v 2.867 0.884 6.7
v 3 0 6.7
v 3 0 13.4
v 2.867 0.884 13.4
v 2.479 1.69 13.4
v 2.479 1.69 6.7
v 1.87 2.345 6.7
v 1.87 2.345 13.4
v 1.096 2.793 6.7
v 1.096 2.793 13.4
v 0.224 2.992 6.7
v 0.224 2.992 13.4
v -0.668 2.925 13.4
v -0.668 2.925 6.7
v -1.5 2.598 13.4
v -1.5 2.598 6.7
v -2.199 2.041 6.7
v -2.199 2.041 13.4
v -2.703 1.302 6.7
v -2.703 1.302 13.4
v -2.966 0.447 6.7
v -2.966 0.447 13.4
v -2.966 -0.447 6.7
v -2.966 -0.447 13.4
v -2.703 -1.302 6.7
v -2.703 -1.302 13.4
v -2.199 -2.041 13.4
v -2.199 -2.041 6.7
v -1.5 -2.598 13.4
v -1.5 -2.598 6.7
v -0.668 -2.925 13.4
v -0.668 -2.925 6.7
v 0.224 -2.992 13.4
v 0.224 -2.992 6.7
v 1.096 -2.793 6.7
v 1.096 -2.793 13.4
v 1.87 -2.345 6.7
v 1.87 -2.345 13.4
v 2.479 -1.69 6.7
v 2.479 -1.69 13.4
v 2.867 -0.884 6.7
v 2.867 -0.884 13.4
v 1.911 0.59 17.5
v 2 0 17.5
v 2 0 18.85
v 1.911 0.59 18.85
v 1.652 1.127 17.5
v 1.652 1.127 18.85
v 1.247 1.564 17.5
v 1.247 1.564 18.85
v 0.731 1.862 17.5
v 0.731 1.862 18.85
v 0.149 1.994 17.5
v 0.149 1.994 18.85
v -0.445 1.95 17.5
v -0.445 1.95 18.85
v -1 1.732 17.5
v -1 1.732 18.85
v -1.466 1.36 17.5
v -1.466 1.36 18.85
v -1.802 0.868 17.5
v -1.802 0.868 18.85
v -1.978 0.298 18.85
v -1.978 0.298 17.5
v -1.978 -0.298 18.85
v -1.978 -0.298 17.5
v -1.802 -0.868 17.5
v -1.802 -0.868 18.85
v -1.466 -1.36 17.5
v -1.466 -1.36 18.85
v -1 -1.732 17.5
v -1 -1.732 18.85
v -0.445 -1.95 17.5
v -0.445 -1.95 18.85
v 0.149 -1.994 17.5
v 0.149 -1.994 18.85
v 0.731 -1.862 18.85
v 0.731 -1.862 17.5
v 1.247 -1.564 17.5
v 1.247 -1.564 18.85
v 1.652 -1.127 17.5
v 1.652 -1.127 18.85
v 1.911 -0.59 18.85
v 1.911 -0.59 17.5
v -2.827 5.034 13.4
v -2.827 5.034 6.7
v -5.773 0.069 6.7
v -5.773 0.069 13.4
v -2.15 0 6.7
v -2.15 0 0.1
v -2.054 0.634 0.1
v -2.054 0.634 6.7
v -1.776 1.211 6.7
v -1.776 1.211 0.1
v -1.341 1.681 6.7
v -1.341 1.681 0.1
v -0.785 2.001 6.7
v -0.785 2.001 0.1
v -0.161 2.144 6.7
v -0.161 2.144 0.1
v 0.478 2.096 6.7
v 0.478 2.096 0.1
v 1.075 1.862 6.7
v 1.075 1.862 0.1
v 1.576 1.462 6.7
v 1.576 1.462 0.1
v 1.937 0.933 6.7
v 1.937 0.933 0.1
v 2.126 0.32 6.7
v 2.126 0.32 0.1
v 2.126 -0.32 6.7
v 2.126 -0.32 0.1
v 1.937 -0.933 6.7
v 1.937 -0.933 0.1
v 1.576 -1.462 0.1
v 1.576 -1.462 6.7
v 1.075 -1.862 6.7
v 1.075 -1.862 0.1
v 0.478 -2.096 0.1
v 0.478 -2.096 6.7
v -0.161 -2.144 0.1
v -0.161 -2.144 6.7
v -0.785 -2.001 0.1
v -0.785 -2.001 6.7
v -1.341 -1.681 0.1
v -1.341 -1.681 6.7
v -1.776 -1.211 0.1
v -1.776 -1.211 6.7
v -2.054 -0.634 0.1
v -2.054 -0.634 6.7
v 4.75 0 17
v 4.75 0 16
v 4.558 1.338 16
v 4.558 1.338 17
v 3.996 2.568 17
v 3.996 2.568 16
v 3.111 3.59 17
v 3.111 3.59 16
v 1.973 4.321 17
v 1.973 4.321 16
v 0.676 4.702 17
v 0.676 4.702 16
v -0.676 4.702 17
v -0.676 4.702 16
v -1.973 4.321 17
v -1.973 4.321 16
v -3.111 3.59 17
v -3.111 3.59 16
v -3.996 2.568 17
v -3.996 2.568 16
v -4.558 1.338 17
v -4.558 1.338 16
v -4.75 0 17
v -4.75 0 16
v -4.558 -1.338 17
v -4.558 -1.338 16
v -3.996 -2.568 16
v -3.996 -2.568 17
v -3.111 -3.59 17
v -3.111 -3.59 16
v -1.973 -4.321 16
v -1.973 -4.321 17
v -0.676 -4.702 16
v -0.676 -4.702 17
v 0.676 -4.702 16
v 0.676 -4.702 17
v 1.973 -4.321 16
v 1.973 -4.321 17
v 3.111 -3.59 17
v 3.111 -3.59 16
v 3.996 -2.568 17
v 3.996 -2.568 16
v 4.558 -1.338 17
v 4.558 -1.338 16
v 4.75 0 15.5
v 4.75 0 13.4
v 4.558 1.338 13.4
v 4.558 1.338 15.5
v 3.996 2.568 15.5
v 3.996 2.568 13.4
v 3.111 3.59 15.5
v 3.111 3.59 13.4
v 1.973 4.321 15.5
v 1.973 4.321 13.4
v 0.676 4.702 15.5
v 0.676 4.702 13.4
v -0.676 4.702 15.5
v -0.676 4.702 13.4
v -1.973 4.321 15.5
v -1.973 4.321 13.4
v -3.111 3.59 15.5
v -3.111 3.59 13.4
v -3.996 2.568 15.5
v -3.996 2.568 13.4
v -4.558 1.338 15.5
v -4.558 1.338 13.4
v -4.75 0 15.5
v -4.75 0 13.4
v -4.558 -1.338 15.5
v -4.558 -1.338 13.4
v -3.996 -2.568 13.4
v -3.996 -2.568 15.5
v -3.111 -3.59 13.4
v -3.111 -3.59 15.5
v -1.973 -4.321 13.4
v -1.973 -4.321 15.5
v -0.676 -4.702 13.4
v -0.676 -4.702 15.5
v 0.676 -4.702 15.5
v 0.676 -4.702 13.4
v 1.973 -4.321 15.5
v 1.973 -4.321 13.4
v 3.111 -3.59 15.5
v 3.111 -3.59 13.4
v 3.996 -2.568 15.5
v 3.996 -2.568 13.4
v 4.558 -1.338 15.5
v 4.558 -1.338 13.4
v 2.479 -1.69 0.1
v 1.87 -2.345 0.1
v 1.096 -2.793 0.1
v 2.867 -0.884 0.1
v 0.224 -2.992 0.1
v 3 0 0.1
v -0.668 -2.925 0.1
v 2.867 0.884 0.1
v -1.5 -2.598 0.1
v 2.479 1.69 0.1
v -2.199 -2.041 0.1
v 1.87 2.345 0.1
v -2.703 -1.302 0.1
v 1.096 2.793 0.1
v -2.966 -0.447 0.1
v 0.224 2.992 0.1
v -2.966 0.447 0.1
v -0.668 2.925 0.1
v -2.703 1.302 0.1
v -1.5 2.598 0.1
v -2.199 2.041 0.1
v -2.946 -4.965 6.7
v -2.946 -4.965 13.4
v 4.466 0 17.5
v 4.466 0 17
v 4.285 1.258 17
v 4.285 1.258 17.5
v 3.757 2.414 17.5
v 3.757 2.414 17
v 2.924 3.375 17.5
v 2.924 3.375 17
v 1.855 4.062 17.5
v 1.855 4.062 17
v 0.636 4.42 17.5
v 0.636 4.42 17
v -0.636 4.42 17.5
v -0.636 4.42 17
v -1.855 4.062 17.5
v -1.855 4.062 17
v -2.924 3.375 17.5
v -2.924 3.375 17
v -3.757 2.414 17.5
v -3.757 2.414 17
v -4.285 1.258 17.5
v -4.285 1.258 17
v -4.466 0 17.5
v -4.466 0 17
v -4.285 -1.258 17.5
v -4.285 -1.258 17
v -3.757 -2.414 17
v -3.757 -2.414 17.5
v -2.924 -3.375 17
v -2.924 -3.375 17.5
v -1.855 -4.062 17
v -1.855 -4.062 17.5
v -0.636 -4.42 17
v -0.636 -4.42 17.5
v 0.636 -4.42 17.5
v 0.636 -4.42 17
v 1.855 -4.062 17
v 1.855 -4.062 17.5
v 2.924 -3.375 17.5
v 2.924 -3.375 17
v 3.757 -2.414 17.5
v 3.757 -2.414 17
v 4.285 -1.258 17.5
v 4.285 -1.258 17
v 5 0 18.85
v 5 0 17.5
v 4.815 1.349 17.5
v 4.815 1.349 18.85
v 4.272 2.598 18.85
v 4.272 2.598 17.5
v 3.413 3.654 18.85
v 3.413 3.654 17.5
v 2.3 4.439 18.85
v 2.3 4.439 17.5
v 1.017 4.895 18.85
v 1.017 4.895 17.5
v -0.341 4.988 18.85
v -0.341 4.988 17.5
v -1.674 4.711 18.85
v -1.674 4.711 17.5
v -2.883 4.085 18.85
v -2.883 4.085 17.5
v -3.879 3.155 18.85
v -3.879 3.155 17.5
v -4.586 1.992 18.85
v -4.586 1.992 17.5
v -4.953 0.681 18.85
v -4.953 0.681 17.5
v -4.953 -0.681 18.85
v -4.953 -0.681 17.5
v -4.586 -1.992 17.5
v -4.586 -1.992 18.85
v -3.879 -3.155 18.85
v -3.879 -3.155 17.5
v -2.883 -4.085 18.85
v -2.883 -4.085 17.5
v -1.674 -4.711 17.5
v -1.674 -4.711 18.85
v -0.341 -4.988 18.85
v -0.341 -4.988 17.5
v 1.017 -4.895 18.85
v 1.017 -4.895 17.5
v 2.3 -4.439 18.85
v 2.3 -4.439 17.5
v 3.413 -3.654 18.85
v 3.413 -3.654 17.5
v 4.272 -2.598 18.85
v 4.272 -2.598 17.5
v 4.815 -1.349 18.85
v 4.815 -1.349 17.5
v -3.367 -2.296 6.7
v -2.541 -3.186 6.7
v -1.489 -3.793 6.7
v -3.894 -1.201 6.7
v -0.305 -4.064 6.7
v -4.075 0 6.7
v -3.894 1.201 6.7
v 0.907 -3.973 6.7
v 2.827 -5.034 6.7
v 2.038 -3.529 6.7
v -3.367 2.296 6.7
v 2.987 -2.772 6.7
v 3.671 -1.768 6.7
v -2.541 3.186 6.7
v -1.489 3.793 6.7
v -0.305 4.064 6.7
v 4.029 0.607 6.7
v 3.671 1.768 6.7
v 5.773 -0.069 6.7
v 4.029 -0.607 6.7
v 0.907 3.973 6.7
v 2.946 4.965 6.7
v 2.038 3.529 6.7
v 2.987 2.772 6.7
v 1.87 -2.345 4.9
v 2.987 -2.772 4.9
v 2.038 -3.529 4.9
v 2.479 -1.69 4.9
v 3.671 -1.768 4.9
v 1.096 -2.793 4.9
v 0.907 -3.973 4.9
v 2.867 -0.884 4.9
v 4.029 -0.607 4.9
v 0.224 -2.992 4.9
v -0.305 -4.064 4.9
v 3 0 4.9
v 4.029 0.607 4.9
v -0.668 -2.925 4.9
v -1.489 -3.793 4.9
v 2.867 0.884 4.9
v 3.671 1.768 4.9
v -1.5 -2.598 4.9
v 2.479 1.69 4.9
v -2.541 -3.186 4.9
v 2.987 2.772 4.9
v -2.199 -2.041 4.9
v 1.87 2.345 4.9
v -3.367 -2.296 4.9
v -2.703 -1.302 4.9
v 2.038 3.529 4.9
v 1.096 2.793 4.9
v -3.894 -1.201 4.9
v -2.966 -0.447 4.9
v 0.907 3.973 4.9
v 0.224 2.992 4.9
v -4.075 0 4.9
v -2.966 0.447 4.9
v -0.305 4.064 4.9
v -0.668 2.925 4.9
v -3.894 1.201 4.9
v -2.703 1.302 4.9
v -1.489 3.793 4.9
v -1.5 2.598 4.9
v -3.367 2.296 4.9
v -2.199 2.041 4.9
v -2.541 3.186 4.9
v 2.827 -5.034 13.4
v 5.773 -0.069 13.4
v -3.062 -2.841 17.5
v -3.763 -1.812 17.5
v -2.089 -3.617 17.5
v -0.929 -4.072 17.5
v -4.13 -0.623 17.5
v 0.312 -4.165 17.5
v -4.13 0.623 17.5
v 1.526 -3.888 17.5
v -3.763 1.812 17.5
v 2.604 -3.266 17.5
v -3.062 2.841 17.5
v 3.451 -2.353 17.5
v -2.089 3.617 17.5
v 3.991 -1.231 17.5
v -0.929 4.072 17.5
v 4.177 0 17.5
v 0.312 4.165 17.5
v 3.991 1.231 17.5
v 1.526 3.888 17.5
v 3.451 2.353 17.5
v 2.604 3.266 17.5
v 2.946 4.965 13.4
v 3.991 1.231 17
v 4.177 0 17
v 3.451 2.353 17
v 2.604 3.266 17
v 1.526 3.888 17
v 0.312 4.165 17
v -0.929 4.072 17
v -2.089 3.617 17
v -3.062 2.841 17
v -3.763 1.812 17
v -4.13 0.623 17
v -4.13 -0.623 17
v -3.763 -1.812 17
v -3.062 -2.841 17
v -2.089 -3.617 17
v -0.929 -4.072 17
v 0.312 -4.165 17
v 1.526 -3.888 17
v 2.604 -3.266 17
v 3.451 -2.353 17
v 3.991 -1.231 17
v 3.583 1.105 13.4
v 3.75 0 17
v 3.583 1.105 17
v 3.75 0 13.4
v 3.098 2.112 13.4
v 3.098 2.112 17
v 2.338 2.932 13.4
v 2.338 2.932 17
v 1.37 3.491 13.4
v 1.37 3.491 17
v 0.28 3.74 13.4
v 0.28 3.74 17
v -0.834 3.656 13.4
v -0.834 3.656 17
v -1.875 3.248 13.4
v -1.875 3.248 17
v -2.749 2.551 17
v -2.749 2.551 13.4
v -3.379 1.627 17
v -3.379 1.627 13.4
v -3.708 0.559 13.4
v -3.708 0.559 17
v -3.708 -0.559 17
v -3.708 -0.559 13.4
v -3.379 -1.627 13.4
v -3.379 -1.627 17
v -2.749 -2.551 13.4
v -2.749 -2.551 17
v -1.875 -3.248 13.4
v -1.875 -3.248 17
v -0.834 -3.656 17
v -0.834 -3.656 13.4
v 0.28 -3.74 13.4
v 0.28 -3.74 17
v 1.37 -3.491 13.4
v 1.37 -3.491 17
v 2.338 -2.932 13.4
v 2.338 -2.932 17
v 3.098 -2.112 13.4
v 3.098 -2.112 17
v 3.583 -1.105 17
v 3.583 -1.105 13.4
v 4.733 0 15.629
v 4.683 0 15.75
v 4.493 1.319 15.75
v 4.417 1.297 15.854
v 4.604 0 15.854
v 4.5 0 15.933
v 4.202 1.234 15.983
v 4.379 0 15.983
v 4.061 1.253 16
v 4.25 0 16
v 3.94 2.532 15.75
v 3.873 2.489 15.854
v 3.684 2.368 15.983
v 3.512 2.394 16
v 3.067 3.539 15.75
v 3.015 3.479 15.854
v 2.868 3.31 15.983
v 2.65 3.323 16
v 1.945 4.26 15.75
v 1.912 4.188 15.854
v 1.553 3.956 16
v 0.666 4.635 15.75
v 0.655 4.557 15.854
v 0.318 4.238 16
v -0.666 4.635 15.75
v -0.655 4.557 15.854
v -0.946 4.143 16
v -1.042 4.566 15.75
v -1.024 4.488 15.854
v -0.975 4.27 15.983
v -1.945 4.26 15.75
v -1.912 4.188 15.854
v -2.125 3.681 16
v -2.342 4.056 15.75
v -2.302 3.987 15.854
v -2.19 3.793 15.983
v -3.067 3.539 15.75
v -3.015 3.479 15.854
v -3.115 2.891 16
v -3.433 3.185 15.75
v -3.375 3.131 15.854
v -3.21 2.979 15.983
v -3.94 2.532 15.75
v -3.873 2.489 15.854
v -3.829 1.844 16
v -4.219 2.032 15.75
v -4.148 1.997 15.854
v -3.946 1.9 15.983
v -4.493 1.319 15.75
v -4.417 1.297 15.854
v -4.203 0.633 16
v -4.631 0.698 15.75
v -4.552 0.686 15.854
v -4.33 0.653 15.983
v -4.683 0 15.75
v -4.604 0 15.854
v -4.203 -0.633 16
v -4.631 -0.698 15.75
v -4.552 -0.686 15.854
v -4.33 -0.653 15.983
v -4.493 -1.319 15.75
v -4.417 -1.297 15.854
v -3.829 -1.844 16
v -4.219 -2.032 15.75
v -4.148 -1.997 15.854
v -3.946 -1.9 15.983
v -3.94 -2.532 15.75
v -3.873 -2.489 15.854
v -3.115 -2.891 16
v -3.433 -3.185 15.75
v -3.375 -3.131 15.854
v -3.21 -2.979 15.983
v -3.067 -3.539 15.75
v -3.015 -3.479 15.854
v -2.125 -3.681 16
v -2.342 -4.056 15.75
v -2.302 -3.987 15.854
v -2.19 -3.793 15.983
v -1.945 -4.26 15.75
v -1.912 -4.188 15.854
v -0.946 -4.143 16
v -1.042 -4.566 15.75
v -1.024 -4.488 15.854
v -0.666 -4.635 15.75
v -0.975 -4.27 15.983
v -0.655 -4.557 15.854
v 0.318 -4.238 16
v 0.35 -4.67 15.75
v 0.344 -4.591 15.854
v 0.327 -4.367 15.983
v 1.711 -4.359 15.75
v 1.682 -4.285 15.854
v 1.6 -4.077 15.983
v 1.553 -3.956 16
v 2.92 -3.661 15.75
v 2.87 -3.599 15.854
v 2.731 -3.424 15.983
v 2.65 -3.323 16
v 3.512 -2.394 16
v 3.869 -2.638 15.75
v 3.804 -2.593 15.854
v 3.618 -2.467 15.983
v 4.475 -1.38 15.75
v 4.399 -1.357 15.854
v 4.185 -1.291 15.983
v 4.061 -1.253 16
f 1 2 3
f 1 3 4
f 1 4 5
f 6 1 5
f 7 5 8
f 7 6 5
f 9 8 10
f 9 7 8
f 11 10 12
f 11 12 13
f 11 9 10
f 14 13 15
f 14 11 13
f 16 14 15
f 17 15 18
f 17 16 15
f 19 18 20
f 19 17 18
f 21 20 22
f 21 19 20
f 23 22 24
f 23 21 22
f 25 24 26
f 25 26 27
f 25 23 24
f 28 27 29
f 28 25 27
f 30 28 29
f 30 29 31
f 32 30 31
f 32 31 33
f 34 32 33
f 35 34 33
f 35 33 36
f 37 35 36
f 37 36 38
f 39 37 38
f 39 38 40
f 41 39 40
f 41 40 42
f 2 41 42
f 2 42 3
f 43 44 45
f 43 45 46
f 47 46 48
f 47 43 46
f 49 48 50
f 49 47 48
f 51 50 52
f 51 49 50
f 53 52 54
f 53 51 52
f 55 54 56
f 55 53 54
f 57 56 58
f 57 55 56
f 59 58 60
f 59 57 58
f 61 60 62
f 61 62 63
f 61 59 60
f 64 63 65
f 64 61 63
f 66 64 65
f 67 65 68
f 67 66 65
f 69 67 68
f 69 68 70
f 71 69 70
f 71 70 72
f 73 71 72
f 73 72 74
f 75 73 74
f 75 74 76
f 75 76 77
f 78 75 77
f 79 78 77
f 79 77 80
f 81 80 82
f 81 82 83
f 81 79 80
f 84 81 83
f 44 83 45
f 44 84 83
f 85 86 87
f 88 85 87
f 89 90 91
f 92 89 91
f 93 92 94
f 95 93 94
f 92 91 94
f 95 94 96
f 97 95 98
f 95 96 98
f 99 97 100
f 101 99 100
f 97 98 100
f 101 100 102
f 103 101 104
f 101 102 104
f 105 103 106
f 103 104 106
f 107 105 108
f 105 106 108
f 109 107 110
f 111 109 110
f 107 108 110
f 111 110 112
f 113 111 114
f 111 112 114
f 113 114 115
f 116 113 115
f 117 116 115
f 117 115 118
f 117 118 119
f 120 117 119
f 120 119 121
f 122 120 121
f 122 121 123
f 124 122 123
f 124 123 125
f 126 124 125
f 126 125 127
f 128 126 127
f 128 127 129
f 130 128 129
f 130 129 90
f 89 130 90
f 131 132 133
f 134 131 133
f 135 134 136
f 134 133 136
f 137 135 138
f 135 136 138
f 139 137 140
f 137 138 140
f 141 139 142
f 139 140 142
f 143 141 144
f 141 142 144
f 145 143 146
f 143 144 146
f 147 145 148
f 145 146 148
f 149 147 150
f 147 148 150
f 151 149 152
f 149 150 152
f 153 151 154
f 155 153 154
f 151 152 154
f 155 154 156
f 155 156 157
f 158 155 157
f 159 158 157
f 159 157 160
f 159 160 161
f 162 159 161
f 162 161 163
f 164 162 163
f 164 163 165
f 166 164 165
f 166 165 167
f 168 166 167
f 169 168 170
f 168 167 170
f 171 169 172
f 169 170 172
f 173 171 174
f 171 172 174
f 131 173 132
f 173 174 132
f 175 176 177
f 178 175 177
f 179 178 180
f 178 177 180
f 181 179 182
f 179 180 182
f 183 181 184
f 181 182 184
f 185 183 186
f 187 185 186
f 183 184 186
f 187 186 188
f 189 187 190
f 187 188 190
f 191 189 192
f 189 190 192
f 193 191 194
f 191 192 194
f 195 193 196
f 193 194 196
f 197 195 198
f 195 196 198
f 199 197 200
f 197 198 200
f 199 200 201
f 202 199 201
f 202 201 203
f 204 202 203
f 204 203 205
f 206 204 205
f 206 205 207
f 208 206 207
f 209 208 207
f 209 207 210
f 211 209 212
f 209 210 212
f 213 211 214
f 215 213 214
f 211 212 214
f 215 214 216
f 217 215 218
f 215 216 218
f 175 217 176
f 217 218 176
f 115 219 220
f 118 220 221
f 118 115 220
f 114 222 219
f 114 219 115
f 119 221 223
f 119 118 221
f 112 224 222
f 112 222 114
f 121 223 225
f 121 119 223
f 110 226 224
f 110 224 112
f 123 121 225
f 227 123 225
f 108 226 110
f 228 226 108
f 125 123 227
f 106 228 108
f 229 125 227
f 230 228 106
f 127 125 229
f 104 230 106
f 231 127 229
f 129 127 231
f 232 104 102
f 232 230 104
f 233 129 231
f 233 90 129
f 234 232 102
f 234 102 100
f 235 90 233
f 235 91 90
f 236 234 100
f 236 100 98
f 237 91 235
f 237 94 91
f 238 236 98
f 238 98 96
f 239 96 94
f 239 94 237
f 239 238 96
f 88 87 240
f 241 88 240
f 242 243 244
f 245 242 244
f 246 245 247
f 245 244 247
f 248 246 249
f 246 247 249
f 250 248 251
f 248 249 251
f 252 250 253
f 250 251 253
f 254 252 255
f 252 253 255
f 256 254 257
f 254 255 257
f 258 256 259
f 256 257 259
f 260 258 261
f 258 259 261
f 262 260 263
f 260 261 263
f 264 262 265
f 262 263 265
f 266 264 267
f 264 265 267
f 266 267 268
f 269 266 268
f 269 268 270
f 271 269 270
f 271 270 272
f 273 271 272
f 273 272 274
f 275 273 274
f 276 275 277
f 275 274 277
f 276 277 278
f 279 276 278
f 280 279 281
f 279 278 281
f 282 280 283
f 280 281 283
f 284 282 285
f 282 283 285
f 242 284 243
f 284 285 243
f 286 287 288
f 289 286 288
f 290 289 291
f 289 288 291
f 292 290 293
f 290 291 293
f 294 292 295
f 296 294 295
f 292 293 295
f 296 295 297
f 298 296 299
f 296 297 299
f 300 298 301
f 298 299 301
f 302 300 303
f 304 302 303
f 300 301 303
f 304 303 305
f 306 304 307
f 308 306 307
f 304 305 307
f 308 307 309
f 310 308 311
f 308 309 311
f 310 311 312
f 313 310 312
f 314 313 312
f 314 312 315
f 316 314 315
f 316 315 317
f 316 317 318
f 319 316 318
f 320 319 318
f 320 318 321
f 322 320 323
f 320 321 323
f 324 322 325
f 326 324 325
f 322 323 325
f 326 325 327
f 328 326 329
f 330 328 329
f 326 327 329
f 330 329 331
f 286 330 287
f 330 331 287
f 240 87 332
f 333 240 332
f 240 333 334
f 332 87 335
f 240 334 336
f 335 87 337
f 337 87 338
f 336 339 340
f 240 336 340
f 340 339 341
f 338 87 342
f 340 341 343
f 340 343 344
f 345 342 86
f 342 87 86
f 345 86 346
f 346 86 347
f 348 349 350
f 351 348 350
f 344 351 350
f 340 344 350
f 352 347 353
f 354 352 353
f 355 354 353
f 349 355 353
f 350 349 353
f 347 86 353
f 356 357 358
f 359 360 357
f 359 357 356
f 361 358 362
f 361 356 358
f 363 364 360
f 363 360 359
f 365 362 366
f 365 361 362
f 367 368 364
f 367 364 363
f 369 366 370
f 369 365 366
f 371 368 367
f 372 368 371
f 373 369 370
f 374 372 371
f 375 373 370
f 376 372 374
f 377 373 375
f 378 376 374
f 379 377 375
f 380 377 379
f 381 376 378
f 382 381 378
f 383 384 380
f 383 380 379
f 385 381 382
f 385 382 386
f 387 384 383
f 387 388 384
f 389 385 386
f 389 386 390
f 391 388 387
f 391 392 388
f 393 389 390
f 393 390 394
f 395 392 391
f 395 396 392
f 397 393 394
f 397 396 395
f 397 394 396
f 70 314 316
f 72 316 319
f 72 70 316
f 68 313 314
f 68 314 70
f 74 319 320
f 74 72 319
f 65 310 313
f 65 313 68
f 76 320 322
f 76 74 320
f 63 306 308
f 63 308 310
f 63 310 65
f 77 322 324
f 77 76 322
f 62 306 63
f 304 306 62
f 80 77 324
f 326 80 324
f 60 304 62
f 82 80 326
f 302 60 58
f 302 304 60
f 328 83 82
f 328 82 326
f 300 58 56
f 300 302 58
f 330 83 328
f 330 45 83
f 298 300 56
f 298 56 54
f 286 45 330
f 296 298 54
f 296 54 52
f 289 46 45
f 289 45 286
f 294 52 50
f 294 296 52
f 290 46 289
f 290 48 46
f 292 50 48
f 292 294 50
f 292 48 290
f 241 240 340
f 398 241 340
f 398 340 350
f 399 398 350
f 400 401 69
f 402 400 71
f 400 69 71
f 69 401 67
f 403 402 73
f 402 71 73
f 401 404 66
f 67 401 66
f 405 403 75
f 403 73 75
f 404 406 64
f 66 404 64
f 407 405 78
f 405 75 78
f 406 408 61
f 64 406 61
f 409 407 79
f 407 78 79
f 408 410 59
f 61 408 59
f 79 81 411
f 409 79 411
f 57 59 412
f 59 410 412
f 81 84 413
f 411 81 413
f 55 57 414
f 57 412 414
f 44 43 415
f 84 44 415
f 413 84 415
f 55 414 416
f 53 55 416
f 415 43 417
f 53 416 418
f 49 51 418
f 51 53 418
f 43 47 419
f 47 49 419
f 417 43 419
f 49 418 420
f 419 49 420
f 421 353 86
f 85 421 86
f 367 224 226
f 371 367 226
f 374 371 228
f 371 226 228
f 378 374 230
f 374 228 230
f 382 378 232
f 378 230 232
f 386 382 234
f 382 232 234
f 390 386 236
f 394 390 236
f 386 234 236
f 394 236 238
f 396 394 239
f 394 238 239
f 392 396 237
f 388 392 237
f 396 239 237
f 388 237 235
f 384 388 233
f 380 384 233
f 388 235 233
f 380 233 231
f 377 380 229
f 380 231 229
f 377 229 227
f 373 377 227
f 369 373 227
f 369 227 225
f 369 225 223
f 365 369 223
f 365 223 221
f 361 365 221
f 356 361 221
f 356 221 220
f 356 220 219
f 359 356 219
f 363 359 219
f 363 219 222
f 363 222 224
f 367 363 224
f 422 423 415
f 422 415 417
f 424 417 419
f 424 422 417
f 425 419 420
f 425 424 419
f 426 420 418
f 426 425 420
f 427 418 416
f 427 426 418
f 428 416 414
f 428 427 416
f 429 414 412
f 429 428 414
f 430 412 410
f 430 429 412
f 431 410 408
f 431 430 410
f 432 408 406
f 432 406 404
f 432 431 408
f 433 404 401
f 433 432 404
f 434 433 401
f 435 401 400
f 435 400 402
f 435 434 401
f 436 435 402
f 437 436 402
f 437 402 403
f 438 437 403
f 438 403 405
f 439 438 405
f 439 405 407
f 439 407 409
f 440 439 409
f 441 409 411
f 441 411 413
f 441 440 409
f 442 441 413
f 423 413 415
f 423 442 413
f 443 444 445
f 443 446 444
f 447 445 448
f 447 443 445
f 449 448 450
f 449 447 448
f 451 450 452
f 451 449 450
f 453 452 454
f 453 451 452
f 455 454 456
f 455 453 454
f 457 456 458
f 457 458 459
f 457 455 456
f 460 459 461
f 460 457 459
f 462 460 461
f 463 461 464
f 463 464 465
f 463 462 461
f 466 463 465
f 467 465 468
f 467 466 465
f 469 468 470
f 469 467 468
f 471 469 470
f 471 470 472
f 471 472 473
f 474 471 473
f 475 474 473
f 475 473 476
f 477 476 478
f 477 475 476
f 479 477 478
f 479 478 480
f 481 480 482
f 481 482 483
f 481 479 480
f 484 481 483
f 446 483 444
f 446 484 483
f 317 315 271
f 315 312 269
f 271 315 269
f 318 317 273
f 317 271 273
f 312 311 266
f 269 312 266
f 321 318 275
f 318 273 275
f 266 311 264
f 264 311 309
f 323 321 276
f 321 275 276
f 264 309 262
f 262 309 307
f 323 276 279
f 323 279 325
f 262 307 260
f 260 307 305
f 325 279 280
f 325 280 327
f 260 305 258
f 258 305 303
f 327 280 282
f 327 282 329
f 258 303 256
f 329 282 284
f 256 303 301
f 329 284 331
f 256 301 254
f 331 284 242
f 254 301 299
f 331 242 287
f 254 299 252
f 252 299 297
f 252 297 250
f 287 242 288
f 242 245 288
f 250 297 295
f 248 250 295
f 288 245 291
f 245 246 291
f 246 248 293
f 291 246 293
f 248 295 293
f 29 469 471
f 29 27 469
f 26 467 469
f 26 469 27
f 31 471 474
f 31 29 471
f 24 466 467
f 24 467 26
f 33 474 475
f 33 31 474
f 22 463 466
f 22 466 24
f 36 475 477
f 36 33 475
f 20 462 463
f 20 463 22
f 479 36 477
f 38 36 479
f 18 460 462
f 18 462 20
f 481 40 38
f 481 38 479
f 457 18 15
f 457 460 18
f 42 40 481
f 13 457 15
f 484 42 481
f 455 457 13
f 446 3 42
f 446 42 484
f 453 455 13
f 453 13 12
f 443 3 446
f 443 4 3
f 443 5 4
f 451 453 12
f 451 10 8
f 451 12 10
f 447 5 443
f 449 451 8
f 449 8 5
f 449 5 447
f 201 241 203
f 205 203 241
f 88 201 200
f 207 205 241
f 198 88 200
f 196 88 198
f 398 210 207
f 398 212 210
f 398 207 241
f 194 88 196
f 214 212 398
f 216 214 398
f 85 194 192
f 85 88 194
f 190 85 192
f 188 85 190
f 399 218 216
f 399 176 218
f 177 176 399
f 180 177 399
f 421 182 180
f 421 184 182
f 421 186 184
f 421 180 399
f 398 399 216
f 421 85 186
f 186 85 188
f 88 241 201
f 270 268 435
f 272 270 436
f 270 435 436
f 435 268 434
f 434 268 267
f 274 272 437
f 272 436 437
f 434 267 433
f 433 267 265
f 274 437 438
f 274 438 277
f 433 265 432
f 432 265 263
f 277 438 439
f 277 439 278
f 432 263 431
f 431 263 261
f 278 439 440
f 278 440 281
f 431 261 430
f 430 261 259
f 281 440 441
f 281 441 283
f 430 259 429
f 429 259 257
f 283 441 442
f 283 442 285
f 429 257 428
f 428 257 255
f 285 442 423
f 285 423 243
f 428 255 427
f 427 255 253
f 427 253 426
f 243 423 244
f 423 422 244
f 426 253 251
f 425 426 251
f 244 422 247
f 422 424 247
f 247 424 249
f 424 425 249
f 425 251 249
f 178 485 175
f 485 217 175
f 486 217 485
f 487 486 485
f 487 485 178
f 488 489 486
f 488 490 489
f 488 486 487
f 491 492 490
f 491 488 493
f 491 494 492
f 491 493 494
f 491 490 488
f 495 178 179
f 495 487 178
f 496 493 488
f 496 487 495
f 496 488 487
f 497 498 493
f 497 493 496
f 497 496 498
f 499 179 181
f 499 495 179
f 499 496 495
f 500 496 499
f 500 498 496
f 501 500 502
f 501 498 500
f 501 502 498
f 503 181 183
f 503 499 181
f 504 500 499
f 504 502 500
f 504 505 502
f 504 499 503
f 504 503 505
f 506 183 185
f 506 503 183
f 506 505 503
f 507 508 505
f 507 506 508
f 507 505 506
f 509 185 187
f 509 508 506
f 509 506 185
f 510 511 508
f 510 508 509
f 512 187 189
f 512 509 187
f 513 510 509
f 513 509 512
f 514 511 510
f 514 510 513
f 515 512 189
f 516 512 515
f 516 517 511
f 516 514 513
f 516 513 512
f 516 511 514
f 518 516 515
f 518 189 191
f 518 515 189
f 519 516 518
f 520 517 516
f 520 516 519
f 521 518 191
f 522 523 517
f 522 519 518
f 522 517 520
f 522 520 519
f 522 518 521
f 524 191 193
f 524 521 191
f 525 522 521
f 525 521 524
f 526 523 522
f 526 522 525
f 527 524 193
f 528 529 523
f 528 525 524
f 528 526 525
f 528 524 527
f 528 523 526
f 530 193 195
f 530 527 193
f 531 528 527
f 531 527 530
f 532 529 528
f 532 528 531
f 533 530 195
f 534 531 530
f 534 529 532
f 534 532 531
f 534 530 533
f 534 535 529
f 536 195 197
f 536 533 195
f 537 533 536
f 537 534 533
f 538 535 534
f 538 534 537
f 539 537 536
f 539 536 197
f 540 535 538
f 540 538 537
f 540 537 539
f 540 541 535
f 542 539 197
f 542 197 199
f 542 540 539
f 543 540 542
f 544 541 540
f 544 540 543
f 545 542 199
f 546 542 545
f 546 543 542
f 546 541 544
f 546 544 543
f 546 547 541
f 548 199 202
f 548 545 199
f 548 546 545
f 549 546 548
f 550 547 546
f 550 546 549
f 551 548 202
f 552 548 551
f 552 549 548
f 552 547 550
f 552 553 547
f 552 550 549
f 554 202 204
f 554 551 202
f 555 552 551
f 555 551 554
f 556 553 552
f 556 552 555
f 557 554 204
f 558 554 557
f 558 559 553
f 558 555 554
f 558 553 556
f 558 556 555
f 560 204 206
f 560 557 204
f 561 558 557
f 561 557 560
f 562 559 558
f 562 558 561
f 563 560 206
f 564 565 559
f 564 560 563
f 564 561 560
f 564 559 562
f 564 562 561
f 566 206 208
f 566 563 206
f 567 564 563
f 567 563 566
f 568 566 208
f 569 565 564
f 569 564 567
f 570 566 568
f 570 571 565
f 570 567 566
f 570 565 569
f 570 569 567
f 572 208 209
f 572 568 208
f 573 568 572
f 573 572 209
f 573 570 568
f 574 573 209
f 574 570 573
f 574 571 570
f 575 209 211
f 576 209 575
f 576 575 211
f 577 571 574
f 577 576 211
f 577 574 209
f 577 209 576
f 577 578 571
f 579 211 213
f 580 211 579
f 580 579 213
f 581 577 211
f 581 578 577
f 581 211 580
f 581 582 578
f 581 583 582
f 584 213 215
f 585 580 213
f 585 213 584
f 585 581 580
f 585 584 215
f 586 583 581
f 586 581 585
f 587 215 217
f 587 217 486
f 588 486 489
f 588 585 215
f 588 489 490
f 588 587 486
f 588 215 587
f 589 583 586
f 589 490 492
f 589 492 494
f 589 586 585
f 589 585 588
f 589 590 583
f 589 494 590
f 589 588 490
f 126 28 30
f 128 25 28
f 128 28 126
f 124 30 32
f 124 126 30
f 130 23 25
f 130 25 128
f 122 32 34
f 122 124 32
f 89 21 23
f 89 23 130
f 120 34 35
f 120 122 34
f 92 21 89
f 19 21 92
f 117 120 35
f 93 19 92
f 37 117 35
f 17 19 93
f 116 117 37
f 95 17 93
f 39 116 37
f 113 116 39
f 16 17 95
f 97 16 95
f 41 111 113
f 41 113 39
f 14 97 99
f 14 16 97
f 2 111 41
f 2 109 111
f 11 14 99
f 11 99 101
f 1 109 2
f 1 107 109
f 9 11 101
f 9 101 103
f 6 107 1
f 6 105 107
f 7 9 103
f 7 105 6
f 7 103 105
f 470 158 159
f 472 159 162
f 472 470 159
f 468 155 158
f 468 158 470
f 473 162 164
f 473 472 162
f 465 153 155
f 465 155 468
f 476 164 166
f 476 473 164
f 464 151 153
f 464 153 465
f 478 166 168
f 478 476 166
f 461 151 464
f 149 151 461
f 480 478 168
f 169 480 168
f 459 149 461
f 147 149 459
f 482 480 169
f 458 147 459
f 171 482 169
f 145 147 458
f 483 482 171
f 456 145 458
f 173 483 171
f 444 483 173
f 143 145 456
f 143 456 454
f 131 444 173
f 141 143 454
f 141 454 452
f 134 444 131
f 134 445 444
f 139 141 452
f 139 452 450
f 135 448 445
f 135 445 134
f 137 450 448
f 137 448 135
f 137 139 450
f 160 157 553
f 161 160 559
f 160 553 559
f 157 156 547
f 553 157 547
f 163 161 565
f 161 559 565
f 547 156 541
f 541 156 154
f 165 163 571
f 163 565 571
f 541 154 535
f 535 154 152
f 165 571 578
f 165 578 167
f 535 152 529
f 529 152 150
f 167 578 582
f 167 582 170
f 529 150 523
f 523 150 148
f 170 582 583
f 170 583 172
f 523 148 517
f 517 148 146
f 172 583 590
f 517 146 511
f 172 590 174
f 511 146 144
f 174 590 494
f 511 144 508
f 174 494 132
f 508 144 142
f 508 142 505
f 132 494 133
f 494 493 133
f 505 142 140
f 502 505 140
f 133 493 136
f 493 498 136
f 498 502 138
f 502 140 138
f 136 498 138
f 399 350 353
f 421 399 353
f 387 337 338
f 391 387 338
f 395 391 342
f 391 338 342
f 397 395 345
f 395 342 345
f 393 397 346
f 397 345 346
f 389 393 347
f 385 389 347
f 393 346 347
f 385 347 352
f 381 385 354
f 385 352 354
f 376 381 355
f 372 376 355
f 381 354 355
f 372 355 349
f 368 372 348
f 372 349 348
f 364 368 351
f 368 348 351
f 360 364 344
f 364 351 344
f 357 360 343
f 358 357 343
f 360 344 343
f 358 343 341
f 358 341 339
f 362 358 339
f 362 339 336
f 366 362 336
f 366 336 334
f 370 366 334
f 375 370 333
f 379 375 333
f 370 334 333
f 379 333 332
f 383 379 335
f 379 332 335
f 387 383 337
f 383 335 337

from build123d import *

# Parameters (mm, degrees)
SKETCH_1_R          = 3
EXTRUDE_1_DEPTH     = 6.7
SKETCH_2_R          = 3
EXTRUDE_2_DEPTH     = 6.7
SKETCH_3_R          = 3.2
CUT_EXTRUDE_1_DEPTH = 0.1
SKETCH_4_R          = 2.15
CUT_EXTRUDE_2_DEPTH = 12.6
SKETCH_5_R          = 4.75
SKETCH_5_R_2        = 3.75
EXTRUDE_3_DEPTH     = 2.6
FILLET_1_R          = 0.5
SKETCH_6_R          = 4.75
SKETCH_6_R_2        = 3.75
EXTRUDE_4_DEPTH     = 1
SKETCH_7_R          = 4.465730979
SKETCH_7_R_2        = 4.177014906
EXTRUDE_5_DEPTH     = 0.5
SKETCH_8_R          = 5
SKETCH_8_R_2        = 2
EXTRUDE_6_DEPTH     = 1.35
SKETCH_9_R          = 4.075
SKETCH_9_R_2        = 3
EXTRUDE_7_DEPTH     = 1.8


with BuildPart() as part:
    # 草图1 → 凸台-拉伸1 (new body)
    with BuildSketch(Plane.XY):
        Circle(SKETCH_1_R)
    extrude(amount=EXTRUDE_1_DEPTH)

    # 草图3 → 切除-拉伸1 (cut)
    with BuildSketch(Plane(origin=(0, 0, 0), x_dir=(-1, 0, 0), z_dir=(0, 0, -1))):
        Circle(SKETCH_3_R)
    extrude(amount=-CUT_EXTRUDE_1_DEPTH, mode=Mode.SUBTRACT)

    # 草图4 → 切除-拉伸2 (cut)
    with BuildSketch(Plane(origin=(0, 0, 0.1), x_dir=(-1, 0, 0), z_dir=(0, 0, -1))):
        Circle(SKETCH_4_R)
    extrude(amount=-CUT_EXTRUDE_2_DEPTH, mode=Mode.SUBTRACT)



with BuildPart() as body_2:
    # 草图2 → 凸台-拉伸2 (new body)
    with BuildSketch(Plane.XY.offset(6.7)):
        Polygon((2.82688706, -5.034088089), (5.7730917, -0.068888037), (2.946204639, 4.965200052), (-2.82688706, 5.034088089), (-5.7730917, 0.068888037), (-2.946204639, -4.965200052), align=None)
        Circle(SKETCH_2_R, mode=Mode.SUBTRACT)
    extrude(amount=EXTRUDE_2_DEPTH)

    # 草图5 → 凸台-拉伸3 (add)
    with BuildSketch(Plane.XY.offset(13.4)):
        Circle(SKETCH_5_R)
        Circle(SKETCH_5_R_2, mode=Mode.SUBTRACT)
    extrude(amount=EXTRUDE_3_DEPTH)

    # 圆角1
    fillet_1_edges = [body_2.edges().sort_by_distance(p)[0] for p in [
        (-4.75, 0, 16),
    ]]
    fillet(fillet_1_edges, radius=FILLET_1_R)

    # 草图6 → 凸台-拉伸4 (add)
    with BuildSketch(Plane.XY.offset(16)):
        Circle(SKETCH_6_R)
        Circle(SKETCH_6_R_2, mode=Mode.SUBTRACT)
    extrude(amount=EXTRUDE_4_DEPTH)


with BuildPart() as body_3:
    # 草图7 → 凸台-拉伸5 (new body)
    with BuildSketch(Plane.XY.offset(17)):
        Circle(SKETCH_7_R)
        Circle(SKETCH_7_R_2, mode=Mode.SUBTRACT)
    extrude(amount=EXTRUDE_5_DEPTH)

    # 草图8 → 凸台-拉伸6 (add)
    with BuildSketch(Plane.XY.offset(17.5)):
        Circle(SKETCH_8_R)
        Circle(SKETCH_8_R_2, mode=Mode.SUBTRACT)
    extrude(amount=EXTRUDE_6_DEPTH)


with BuildPart() as part_1:
    add(part.part)

    add(body_2.part)  # 凸台-拉伸7 merges body 2
    # 草图9 → 凸台-拉伸7 (add)
    with BuildSketch(Plane(origin=(0, 0, 6.7), x_dir=(-1, 0, 0), z_dir=(0, 0, -1))):
        Circle(SKETCH_9_R)
        Circle(SKETCH_9_R_2, mode=Mode.SUBTRACT)
    extrude(amount=EXTRUDE_7_DEPTH)


solid = Compound([body_3.part, part_1.part])
